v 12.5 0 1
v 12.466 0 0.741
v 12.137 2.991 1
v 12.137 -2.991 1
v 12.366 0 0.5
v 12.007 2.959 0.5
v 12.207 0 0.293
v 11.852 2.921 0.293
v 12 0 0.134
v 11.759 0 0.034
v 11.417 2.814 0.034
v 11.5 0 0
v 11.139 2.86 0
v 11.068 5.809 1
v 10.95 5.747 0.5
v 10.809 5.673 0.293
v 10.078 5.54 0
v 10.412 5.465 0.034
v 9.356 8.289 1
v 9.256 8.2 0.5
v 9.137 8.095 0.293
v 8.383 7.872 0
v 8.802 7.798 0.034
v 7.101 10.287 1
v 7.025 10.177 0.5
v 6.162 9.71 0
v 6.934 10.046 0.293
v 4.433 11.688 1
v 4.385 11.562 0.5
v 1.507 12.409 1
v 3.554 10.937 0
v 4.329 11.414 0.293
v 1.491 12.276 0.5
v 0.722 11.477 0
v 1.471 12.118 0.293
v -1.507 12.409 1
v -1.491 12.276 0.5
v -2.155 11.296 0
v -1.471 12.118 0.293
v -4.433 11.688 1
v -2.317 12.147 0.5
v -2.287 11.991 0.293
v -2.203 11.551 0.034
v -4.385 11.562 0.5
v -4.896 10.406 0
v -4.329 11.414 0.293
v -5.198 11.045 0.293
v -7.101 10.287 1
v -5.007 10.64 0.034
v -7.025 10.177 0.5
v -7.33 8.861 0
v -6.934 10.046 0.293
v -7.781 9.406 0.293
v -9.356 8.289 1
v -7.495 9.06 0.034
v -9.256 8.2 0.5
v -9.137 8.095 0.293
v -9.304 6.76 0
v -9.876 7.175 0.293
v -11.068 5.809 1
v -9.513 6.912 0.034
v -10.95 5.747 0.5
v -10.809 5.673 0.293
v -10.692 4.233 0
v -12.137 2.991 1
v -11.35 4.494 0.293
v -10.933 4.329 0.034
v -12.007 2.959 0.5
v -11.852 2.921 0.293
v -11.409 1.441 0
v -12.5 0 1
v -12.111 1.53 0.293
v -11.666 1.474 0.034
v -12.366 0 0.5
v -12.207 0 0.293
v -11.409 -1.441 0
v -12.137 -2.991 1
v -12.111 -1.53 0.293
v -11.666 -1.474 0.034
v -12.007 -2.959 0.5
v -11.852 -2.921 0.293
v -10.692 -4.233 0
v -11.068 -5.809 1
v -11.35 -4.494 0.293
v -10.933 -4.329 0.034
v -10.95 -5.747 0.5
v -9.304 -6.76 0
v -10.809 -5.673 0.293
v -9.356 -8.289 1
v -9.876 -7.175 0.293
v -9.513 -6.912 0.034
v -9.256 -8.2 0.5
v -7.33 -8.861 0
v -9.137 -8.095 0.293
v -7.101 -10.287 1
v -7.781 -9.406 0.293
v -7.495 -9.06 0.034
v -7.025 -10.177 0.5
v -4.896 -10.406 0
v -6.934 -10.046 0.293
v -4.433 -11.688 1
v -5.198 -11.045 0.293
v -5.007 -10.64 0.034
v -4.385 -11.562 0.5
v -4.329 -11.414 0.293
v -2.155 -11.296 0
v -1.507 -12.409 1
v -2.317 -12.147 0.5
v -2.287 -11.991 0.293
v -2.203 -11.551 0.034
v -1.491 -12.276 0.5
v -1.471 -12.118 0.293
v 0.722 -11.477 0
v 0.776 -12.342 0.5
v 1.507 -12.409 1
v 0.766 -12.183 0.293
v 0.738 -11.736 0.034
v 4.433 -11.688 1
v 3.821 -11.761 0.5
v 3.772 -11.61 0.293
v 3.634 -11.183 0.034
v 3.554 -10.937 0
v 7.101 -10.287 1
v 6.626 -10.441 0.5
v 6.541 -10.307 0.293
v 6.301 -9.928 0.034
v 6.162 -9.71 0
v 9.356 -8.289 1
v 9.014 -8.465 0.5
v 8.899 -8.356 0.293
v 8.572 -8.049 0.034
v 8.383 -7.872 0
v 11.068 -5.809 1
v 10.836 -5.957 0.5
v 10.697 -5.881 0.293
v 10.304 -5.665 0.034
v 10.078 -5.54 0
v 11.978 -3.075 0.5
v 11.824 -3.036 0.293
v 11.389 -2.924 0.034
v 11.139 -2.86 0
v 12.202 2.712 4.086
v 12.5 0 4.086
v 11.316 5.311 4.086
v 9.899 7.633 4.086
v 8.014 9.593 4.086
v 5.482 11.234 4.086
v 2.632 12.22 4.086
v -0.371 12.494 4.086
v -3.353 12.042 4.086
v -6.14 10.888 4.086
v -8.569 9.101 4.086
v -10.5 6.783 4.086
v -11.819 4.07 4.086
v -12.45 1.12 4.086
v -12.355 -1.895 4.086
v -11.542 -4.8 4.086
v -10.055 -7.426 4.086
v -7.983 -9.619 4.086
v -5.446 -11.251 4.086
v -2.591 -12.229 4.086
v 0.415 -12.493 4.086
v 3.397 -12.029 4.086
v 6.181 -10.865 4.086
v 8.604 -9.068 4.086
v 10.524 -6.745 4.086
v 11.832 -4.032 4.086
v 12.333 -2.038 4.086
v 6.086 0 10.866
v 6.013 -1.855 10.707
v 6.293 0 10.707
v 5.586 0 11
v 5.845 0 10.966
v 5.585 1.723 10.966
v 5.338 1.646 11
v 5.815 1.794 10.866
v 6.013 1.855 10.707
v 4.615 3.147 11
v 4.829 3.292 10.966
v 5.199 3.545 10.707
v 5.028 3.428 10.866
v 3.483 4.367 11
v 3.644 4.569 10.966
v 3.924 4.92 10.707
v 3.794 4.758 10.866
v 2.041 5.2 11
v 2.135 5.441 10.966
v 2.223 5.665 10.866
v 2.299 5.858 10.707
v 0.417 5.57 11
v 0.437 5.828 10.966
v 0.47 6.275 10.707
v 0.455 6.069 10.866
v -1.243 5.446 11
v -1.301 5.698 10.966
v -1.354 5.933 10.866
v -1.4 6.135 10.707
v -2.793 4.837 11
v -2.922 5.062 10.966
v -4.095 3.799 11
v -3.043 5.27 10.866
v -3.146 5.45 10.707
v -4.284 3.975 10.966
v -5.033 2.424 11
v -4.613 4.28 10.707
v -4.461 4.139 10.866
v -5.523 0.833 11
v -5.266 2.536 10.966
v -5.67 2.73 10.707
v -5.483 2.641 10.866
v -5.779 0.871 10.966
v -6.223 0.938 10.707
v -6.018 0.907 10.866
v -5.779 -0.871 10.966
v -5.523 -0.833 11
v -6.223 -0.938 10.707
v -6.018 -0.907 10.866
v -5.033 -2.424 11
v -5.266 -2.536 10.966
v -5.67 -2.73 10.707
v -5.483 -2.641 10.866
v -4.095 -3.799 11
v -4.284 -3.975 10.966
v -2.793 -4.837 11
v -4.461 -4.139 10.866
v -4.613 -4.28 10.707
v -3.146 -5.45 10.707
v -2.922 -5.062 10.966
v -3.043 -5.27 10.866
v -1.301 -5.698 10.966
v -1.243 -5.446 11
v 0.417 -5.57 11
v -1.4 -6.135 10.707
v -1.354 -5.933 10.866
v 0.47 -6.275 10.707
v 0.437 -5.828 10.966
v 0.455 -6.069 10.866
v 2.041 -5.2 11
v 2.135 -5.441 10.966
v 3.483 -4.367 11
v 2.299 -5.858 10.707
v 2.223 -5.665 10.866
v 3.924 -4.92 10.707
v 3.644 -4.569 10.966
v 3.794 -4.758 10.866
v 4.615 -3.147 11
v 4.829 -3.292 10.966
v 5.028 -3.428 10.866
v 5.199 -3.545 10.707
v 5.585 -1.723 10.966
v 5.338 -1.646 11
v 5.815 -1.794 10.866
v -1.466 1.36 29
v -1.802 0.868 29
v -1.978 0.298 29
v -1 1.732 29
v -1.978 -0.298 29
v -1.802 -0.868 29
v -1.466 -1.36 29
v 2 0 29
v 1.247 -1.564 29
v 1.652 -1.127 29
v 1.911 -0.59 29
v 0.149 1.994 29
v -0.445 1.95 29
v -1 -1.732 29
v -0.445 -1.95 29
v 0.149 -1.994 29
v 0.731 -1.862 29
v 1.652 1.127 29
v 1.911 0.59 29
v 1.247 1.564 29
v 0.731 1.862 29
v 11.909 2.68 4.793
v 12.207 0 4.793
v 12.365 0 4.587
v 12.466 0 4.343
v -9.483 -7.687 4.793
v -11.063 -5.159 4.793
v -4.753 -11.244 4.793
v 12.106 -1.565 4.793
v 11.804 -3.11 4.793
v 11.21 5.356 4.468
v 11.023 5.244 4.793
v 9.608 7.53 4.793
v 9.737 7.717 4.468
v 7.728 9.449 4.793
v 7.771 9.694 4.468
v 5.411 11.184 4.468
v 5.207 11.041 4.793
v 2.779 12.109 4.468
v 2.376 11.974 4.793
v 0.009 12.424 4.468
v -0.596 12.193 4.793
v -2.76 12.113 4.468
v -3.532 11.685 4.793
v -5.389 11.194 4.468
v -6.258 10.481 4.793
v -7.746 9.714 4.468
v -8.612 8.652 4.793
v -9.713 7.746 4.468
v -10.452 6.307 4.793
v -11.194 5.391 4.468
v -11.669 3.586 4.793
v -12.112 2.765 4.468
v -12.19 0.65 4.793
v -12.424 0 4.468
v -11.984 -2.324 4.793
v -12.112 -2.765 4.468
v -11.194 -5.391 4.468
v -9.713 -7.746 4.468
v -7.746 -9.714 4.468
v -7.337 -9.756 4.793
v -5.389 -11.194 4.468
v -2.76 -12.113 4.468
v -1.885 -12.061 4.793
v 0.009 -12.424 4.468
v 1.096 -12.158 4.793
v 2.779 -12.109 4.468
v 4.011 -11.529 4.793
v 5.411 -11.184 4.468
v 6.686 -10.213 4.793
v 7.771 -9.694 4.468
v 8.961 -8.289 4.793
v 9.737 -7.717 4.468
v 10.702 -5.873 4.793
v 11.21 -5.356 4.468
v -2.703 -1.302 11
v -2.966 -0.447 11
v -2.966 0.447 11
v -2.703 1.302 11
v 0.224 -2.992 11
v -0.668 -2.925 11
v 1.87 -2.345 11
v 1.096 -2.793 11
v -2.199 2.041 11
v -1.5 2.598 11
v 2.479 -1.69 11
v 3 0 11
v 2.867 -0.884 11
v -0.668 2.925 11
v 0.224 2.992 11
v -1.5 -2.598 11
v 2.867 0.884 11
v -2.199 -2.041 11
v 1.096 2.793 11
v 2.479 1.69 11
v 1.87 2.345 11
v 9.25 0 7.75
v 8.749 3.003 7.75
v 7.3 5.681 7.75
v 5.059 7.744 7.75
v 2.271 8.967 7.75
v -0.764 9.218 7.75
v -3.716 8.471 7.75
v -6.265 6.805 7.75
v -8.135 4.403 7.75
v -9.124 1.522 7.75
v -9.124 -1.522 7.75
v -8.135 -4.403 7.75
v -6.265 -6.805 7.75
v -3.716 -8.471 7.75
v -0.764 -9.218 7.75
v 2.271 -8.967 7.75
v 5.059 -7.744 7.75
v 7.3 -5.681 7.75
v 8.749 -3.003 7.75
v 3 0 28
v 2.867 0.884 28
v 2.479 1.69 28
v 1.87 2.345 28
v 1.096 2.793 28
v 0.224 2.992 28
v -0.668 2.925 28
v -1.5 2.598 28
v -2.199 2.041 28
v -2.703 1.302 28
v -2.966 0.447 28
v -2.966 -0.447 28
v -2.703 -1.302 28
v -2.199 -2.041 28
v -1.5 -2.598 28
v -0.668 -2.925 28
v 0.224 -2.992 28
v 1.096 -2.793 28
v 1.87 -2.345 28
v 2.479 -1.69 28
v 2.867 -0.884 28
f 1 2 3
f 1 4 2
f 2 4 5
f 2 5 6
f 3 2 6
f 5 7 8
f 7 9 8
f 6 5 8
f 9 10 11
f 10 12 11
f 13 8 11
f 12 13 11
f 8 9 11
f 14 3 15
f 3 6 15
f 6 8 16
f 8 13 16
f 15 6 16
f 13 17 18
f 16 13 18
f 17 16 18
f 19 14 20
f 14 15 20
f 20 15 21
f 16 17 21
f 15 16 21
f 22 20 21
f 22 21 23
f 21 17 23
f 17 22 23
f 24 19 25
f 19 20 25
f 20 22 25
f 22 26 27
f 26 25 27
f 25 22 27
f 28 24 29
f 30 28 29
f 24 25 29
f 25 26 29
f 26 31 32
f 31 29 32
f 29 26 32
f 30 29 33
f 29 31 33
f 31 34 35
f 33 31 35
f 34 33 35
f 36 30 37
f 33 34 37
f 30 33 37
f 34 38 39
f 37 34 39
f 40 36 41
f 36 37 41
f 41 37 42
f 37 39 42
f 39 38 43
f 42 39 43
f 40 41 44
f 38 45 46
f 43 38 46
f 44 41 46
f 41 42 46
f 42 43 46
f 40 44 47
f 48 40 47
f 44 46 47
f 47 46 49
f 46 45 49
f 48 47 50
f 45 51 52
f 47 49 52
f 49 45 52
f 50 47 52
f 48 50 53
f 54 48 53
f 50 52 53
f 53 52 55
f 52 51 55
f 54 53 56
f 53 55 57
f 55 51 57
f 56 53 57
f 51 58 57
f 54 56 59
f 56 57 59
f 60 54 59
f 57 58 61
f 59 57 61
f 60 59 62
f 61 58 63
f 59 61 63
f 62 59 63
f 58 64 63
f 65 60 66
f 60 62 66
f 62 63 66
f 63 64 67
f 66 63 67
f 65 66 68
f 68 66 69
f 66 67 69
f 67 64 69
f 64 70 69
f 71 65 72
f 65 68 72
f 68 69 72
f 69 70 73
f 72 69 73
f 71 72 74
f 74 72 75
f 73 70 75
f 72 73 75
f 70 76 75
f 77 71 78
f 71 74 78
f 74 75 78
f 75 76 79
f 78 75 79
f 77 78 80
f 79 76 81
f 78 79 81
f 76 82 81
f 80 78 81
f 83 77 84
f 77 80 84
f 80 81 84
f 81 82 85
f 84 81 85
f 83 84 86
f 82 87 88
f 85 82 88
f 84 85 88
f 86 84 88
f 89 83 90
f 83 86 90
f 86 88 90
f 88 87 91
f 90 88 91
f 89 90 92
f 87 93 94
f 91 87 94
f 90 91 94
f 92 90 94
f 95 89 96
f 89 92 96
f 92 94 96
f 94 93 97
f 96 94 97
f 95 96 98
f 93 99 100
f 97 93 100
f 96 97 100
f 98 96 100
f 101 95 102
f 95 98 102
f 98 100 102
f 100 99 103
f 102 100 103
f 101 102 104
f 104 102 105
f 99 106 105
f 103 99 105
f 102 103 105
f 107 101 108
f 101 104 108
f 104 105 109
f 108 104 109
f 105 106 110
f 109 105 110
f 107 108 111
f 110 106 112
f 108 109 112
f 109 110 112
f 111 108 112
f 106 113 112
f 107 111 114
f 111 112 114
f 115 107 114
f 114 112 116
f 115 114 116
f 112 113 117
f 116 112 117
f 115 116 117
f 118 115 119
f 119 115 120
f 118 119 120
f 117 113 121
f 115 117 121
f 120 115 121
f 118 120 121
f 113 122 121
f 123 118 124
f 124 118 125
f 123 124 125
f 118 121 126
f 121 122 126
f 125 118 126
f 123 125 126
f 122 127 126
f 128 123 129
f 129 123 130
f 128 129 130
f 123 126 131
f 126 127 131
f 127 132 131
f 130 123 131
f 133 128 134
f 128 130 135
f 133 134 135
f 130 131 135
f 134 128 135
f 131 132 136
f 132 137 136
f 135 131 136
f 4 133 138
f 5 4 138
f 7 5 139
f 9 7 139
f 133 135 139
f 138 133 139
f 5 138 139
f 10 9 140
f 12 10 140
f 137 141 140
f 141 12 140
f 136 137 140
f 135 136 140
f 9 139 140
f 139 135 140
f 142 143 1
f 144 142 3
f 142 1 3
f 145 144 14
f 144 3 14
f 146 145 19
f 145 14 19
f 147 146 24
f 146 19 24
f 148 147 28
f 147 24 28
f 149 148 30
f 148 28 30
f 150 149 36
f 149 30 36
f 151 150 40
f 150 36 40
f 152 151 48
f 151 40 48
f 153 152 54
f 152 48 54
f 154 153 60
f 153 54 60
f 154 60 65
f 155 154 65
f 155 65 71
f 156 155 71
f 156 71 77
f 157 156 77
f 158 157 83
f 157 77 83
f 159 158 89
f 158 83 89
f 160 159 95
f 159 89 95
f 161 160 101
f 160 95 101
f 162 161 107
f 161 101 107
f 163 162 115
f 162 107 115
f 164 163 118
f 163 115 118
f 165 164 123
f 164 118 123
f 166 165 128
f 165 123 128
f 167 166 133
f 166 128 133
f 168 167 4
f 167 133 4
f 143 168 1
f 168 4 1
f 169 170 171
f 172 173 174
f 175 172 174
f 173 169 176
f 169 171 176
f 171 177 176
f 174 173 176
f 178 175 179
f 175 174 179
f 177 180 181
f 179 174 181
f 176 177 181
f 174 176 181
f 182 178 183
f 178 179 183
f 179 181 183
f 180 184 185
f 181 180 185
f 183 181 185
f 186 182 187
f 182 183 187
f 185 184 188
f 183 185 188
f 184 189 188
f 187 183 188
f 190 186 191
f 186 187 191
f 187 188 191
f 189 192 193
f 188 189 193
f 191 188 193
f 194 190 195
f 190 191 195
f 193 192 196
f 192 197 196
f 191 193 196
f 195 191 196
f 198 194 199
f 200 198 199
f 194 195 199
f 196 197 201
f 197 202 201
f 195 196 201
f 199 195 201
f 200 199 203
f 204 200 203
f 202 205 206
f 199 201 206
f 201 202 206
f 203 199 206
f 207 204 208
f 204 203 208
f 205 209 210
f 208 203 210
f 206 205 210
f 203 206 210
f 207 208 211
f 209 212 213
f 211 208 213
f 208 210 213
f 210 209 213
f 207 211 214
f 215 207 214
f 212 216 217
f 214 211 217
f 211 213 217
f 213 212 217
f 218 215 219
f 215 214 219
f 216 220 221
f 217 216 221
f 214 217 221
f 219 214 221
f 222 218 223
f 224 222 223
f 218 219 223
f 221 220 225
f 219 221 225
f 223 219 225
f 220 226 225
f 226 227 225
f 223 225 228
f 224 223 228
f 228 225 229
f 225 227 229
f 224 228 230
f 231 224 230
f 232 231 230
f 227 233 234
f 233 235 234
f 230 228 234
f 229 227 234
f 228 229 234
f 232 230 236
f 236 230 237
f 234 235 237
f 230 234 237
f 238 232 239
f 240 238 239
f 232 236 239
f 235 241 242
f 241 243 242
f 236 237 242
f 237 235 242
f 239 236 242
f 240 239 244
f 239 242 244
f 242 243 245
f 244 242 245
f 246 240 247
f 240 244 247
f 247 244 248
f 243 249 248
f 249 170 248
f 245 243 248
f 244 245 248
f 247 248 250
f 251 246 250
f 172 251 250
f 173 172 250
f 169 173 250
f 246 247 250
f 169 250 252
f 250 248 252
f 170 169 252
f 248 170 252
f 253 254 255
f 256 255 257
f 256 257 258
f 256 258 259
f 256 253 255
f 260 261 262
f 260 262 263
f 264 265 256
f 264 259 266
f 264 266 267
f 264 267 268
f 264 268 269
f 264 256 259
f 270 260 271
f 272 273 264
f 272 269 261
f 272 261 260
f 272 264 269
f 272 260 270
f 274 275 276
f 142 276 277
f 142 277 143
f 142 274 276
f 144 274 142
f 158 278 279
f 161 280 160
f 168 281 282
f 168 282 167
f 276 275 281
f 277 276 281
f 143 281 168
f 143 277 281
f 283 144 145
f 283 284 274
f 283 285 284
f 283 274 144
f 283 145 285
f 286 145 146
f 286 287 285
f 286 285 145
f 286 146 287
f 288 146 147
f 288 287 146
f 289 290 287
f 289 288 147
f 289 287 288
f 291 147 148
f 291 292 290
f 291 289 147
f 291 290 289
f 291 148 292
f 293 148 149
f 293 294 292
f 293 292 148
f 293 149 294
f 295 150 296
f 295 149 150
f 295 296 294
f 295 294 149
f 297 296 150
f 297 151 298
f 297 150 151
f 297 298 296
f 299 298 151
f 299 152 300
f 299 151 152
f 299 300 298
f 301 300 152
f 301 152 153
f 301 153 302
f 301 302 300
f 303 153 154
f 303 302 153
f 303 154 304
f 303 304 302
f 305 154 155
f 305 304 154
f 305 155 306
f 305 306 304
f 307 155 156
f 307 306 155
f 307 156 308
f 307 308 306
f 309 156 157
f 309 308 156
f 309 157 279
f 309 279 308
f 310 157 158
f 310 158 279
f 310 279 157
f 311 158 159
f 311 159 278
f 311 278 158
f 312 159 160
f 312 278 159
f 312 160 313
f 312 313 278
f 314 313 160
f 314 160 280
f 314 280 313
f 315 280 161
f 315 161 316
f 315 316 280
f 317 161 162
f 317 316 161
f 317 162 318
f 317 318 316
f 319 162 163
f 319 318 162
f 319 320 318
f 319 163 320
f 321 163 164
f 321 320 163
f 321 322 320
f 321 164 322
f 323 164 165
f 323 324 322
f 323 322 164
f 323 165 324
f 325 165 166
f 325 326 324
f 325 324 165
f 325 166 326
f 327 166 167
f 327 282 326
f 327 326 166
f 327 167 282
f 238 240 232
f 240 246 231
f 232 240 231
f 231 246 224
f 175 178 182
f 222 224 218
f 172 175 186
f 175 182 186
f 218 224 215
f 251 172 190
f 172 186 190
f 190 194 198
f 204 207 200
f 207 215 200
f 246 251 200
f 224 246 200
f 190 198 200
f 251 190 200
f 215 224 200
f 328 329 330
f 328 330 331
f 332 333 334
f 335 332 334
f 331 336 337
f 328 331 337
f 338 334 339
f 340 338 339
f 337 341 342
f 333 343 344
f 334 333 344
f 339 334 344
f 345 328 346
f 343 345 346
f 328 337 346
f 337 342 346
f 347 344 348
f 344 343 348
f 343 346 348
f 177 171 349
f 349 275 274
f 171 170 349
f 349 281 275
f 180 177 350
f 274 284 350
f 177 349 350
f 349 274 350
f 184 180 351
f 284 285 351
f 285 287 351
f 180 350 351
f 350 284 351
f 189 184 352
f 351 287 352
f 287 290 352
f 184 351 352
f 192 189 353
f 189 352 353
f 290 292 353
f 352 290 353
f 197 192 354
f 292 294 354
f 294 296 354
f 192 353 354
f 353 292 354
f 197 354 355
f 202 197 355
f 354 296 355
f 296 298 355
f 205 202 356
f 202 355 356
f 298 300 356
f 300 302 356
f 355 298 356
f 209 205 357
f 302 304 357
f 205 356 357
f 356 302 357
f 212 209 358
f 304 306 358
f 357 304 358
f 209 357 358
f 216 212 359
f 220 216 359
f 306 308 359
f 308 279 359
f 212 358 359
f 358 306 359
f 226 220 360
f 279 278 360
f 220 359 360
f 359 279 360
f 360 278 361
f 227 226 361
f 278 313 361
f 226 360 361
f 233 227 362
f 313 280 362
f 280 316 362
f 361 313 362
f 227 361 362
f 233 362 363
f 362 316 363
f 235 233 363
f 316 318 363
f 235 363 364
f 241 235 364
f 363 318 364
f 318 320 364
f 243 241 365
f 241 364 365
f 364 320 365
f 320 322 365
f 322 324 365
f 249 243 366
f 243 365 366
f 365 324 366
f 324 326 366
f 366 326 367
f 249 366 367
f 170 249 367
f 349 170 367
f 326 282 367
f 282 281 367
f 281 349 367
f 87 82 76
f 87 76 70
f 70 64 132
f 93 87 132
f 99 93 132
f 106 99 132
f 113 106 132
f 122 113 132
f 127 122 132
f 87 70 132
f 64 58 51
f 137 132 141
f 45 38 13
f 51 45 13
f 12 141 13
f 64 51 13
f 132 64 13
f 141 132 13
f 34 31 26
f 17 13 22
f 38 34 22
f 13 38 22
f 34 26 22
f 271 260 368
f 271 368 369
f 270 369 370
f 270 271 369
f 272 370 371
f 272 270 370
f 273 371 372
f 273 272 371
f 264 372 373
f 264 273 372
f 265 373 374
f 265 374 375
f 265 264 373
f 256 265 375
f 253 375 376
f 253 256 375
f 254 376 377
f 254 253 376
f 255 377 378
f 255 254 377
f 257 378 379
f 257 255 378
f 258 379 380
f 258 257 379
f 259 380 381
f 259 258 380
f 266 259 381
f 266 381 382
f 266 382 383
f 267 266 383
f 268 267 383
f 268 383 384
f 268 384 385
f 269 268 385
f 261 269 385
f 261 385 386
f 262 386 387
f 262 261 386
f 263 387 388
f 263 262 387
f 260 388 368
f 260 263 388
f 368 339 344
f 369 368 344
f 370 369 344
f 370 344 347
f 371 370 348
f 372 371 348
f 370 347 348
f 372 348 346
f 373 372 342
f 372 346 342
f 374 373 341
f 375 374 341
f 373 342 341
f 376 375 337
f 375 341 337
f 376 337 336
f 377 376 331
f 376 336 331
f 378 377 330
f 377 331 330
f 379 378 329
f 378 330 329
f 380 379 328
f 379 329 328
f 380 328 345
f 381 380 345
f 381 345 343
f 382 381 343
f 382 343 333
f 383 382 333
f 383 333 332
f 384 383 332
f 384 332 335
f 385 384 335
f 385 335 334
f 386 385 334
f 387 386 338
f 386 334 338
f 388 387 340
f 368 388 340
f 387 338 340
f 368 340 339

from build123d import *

# Parameters (mm, degrees)
FILLET_R     = 1
SKETCH001_R  = 3
PAD_DEPTH    = 18
CHAMFER_SIZE = 1


with BuildPart() as body:
    # Sketch → Revolution (revolve)
    with BuildSketch(Plane.XZ):
        Polygon((0, 11), (6, 11), (12.5, 4.5), (12.5, 0), (0, 0), align=None)
    revolve(axis=Axis((0, 0, 0), (0, 0, 1)))

    # Fillet
    fillet_edges = [body.edges().sort_by_distance(p)[0] for p in [
        (-12.5, 0, 0),
        (-12.5, 0, 4.5),
        (-6, 0, 11),
    ]]
    fillet(fillet_edges, radius=FILLET_R)


with BuildPart() as body001:
    # Sketch001 (on DatumPlane) → Pad (new body)
    with BuildSketch(Plane.XY.offset(11)):
        Circle(SKETCH001_R)
    extrude(amount=PAD_DEPTH)

    # Chamfer
    chamfer_edges = [body001.edges().sort_by_distance(p)[0] for p in [
        (-3, 0, 29),
    ]]
    chamfer(chamfer_edges, length=CHAMFER_SIZE)


solid = Compound([body.part, body001.part])
